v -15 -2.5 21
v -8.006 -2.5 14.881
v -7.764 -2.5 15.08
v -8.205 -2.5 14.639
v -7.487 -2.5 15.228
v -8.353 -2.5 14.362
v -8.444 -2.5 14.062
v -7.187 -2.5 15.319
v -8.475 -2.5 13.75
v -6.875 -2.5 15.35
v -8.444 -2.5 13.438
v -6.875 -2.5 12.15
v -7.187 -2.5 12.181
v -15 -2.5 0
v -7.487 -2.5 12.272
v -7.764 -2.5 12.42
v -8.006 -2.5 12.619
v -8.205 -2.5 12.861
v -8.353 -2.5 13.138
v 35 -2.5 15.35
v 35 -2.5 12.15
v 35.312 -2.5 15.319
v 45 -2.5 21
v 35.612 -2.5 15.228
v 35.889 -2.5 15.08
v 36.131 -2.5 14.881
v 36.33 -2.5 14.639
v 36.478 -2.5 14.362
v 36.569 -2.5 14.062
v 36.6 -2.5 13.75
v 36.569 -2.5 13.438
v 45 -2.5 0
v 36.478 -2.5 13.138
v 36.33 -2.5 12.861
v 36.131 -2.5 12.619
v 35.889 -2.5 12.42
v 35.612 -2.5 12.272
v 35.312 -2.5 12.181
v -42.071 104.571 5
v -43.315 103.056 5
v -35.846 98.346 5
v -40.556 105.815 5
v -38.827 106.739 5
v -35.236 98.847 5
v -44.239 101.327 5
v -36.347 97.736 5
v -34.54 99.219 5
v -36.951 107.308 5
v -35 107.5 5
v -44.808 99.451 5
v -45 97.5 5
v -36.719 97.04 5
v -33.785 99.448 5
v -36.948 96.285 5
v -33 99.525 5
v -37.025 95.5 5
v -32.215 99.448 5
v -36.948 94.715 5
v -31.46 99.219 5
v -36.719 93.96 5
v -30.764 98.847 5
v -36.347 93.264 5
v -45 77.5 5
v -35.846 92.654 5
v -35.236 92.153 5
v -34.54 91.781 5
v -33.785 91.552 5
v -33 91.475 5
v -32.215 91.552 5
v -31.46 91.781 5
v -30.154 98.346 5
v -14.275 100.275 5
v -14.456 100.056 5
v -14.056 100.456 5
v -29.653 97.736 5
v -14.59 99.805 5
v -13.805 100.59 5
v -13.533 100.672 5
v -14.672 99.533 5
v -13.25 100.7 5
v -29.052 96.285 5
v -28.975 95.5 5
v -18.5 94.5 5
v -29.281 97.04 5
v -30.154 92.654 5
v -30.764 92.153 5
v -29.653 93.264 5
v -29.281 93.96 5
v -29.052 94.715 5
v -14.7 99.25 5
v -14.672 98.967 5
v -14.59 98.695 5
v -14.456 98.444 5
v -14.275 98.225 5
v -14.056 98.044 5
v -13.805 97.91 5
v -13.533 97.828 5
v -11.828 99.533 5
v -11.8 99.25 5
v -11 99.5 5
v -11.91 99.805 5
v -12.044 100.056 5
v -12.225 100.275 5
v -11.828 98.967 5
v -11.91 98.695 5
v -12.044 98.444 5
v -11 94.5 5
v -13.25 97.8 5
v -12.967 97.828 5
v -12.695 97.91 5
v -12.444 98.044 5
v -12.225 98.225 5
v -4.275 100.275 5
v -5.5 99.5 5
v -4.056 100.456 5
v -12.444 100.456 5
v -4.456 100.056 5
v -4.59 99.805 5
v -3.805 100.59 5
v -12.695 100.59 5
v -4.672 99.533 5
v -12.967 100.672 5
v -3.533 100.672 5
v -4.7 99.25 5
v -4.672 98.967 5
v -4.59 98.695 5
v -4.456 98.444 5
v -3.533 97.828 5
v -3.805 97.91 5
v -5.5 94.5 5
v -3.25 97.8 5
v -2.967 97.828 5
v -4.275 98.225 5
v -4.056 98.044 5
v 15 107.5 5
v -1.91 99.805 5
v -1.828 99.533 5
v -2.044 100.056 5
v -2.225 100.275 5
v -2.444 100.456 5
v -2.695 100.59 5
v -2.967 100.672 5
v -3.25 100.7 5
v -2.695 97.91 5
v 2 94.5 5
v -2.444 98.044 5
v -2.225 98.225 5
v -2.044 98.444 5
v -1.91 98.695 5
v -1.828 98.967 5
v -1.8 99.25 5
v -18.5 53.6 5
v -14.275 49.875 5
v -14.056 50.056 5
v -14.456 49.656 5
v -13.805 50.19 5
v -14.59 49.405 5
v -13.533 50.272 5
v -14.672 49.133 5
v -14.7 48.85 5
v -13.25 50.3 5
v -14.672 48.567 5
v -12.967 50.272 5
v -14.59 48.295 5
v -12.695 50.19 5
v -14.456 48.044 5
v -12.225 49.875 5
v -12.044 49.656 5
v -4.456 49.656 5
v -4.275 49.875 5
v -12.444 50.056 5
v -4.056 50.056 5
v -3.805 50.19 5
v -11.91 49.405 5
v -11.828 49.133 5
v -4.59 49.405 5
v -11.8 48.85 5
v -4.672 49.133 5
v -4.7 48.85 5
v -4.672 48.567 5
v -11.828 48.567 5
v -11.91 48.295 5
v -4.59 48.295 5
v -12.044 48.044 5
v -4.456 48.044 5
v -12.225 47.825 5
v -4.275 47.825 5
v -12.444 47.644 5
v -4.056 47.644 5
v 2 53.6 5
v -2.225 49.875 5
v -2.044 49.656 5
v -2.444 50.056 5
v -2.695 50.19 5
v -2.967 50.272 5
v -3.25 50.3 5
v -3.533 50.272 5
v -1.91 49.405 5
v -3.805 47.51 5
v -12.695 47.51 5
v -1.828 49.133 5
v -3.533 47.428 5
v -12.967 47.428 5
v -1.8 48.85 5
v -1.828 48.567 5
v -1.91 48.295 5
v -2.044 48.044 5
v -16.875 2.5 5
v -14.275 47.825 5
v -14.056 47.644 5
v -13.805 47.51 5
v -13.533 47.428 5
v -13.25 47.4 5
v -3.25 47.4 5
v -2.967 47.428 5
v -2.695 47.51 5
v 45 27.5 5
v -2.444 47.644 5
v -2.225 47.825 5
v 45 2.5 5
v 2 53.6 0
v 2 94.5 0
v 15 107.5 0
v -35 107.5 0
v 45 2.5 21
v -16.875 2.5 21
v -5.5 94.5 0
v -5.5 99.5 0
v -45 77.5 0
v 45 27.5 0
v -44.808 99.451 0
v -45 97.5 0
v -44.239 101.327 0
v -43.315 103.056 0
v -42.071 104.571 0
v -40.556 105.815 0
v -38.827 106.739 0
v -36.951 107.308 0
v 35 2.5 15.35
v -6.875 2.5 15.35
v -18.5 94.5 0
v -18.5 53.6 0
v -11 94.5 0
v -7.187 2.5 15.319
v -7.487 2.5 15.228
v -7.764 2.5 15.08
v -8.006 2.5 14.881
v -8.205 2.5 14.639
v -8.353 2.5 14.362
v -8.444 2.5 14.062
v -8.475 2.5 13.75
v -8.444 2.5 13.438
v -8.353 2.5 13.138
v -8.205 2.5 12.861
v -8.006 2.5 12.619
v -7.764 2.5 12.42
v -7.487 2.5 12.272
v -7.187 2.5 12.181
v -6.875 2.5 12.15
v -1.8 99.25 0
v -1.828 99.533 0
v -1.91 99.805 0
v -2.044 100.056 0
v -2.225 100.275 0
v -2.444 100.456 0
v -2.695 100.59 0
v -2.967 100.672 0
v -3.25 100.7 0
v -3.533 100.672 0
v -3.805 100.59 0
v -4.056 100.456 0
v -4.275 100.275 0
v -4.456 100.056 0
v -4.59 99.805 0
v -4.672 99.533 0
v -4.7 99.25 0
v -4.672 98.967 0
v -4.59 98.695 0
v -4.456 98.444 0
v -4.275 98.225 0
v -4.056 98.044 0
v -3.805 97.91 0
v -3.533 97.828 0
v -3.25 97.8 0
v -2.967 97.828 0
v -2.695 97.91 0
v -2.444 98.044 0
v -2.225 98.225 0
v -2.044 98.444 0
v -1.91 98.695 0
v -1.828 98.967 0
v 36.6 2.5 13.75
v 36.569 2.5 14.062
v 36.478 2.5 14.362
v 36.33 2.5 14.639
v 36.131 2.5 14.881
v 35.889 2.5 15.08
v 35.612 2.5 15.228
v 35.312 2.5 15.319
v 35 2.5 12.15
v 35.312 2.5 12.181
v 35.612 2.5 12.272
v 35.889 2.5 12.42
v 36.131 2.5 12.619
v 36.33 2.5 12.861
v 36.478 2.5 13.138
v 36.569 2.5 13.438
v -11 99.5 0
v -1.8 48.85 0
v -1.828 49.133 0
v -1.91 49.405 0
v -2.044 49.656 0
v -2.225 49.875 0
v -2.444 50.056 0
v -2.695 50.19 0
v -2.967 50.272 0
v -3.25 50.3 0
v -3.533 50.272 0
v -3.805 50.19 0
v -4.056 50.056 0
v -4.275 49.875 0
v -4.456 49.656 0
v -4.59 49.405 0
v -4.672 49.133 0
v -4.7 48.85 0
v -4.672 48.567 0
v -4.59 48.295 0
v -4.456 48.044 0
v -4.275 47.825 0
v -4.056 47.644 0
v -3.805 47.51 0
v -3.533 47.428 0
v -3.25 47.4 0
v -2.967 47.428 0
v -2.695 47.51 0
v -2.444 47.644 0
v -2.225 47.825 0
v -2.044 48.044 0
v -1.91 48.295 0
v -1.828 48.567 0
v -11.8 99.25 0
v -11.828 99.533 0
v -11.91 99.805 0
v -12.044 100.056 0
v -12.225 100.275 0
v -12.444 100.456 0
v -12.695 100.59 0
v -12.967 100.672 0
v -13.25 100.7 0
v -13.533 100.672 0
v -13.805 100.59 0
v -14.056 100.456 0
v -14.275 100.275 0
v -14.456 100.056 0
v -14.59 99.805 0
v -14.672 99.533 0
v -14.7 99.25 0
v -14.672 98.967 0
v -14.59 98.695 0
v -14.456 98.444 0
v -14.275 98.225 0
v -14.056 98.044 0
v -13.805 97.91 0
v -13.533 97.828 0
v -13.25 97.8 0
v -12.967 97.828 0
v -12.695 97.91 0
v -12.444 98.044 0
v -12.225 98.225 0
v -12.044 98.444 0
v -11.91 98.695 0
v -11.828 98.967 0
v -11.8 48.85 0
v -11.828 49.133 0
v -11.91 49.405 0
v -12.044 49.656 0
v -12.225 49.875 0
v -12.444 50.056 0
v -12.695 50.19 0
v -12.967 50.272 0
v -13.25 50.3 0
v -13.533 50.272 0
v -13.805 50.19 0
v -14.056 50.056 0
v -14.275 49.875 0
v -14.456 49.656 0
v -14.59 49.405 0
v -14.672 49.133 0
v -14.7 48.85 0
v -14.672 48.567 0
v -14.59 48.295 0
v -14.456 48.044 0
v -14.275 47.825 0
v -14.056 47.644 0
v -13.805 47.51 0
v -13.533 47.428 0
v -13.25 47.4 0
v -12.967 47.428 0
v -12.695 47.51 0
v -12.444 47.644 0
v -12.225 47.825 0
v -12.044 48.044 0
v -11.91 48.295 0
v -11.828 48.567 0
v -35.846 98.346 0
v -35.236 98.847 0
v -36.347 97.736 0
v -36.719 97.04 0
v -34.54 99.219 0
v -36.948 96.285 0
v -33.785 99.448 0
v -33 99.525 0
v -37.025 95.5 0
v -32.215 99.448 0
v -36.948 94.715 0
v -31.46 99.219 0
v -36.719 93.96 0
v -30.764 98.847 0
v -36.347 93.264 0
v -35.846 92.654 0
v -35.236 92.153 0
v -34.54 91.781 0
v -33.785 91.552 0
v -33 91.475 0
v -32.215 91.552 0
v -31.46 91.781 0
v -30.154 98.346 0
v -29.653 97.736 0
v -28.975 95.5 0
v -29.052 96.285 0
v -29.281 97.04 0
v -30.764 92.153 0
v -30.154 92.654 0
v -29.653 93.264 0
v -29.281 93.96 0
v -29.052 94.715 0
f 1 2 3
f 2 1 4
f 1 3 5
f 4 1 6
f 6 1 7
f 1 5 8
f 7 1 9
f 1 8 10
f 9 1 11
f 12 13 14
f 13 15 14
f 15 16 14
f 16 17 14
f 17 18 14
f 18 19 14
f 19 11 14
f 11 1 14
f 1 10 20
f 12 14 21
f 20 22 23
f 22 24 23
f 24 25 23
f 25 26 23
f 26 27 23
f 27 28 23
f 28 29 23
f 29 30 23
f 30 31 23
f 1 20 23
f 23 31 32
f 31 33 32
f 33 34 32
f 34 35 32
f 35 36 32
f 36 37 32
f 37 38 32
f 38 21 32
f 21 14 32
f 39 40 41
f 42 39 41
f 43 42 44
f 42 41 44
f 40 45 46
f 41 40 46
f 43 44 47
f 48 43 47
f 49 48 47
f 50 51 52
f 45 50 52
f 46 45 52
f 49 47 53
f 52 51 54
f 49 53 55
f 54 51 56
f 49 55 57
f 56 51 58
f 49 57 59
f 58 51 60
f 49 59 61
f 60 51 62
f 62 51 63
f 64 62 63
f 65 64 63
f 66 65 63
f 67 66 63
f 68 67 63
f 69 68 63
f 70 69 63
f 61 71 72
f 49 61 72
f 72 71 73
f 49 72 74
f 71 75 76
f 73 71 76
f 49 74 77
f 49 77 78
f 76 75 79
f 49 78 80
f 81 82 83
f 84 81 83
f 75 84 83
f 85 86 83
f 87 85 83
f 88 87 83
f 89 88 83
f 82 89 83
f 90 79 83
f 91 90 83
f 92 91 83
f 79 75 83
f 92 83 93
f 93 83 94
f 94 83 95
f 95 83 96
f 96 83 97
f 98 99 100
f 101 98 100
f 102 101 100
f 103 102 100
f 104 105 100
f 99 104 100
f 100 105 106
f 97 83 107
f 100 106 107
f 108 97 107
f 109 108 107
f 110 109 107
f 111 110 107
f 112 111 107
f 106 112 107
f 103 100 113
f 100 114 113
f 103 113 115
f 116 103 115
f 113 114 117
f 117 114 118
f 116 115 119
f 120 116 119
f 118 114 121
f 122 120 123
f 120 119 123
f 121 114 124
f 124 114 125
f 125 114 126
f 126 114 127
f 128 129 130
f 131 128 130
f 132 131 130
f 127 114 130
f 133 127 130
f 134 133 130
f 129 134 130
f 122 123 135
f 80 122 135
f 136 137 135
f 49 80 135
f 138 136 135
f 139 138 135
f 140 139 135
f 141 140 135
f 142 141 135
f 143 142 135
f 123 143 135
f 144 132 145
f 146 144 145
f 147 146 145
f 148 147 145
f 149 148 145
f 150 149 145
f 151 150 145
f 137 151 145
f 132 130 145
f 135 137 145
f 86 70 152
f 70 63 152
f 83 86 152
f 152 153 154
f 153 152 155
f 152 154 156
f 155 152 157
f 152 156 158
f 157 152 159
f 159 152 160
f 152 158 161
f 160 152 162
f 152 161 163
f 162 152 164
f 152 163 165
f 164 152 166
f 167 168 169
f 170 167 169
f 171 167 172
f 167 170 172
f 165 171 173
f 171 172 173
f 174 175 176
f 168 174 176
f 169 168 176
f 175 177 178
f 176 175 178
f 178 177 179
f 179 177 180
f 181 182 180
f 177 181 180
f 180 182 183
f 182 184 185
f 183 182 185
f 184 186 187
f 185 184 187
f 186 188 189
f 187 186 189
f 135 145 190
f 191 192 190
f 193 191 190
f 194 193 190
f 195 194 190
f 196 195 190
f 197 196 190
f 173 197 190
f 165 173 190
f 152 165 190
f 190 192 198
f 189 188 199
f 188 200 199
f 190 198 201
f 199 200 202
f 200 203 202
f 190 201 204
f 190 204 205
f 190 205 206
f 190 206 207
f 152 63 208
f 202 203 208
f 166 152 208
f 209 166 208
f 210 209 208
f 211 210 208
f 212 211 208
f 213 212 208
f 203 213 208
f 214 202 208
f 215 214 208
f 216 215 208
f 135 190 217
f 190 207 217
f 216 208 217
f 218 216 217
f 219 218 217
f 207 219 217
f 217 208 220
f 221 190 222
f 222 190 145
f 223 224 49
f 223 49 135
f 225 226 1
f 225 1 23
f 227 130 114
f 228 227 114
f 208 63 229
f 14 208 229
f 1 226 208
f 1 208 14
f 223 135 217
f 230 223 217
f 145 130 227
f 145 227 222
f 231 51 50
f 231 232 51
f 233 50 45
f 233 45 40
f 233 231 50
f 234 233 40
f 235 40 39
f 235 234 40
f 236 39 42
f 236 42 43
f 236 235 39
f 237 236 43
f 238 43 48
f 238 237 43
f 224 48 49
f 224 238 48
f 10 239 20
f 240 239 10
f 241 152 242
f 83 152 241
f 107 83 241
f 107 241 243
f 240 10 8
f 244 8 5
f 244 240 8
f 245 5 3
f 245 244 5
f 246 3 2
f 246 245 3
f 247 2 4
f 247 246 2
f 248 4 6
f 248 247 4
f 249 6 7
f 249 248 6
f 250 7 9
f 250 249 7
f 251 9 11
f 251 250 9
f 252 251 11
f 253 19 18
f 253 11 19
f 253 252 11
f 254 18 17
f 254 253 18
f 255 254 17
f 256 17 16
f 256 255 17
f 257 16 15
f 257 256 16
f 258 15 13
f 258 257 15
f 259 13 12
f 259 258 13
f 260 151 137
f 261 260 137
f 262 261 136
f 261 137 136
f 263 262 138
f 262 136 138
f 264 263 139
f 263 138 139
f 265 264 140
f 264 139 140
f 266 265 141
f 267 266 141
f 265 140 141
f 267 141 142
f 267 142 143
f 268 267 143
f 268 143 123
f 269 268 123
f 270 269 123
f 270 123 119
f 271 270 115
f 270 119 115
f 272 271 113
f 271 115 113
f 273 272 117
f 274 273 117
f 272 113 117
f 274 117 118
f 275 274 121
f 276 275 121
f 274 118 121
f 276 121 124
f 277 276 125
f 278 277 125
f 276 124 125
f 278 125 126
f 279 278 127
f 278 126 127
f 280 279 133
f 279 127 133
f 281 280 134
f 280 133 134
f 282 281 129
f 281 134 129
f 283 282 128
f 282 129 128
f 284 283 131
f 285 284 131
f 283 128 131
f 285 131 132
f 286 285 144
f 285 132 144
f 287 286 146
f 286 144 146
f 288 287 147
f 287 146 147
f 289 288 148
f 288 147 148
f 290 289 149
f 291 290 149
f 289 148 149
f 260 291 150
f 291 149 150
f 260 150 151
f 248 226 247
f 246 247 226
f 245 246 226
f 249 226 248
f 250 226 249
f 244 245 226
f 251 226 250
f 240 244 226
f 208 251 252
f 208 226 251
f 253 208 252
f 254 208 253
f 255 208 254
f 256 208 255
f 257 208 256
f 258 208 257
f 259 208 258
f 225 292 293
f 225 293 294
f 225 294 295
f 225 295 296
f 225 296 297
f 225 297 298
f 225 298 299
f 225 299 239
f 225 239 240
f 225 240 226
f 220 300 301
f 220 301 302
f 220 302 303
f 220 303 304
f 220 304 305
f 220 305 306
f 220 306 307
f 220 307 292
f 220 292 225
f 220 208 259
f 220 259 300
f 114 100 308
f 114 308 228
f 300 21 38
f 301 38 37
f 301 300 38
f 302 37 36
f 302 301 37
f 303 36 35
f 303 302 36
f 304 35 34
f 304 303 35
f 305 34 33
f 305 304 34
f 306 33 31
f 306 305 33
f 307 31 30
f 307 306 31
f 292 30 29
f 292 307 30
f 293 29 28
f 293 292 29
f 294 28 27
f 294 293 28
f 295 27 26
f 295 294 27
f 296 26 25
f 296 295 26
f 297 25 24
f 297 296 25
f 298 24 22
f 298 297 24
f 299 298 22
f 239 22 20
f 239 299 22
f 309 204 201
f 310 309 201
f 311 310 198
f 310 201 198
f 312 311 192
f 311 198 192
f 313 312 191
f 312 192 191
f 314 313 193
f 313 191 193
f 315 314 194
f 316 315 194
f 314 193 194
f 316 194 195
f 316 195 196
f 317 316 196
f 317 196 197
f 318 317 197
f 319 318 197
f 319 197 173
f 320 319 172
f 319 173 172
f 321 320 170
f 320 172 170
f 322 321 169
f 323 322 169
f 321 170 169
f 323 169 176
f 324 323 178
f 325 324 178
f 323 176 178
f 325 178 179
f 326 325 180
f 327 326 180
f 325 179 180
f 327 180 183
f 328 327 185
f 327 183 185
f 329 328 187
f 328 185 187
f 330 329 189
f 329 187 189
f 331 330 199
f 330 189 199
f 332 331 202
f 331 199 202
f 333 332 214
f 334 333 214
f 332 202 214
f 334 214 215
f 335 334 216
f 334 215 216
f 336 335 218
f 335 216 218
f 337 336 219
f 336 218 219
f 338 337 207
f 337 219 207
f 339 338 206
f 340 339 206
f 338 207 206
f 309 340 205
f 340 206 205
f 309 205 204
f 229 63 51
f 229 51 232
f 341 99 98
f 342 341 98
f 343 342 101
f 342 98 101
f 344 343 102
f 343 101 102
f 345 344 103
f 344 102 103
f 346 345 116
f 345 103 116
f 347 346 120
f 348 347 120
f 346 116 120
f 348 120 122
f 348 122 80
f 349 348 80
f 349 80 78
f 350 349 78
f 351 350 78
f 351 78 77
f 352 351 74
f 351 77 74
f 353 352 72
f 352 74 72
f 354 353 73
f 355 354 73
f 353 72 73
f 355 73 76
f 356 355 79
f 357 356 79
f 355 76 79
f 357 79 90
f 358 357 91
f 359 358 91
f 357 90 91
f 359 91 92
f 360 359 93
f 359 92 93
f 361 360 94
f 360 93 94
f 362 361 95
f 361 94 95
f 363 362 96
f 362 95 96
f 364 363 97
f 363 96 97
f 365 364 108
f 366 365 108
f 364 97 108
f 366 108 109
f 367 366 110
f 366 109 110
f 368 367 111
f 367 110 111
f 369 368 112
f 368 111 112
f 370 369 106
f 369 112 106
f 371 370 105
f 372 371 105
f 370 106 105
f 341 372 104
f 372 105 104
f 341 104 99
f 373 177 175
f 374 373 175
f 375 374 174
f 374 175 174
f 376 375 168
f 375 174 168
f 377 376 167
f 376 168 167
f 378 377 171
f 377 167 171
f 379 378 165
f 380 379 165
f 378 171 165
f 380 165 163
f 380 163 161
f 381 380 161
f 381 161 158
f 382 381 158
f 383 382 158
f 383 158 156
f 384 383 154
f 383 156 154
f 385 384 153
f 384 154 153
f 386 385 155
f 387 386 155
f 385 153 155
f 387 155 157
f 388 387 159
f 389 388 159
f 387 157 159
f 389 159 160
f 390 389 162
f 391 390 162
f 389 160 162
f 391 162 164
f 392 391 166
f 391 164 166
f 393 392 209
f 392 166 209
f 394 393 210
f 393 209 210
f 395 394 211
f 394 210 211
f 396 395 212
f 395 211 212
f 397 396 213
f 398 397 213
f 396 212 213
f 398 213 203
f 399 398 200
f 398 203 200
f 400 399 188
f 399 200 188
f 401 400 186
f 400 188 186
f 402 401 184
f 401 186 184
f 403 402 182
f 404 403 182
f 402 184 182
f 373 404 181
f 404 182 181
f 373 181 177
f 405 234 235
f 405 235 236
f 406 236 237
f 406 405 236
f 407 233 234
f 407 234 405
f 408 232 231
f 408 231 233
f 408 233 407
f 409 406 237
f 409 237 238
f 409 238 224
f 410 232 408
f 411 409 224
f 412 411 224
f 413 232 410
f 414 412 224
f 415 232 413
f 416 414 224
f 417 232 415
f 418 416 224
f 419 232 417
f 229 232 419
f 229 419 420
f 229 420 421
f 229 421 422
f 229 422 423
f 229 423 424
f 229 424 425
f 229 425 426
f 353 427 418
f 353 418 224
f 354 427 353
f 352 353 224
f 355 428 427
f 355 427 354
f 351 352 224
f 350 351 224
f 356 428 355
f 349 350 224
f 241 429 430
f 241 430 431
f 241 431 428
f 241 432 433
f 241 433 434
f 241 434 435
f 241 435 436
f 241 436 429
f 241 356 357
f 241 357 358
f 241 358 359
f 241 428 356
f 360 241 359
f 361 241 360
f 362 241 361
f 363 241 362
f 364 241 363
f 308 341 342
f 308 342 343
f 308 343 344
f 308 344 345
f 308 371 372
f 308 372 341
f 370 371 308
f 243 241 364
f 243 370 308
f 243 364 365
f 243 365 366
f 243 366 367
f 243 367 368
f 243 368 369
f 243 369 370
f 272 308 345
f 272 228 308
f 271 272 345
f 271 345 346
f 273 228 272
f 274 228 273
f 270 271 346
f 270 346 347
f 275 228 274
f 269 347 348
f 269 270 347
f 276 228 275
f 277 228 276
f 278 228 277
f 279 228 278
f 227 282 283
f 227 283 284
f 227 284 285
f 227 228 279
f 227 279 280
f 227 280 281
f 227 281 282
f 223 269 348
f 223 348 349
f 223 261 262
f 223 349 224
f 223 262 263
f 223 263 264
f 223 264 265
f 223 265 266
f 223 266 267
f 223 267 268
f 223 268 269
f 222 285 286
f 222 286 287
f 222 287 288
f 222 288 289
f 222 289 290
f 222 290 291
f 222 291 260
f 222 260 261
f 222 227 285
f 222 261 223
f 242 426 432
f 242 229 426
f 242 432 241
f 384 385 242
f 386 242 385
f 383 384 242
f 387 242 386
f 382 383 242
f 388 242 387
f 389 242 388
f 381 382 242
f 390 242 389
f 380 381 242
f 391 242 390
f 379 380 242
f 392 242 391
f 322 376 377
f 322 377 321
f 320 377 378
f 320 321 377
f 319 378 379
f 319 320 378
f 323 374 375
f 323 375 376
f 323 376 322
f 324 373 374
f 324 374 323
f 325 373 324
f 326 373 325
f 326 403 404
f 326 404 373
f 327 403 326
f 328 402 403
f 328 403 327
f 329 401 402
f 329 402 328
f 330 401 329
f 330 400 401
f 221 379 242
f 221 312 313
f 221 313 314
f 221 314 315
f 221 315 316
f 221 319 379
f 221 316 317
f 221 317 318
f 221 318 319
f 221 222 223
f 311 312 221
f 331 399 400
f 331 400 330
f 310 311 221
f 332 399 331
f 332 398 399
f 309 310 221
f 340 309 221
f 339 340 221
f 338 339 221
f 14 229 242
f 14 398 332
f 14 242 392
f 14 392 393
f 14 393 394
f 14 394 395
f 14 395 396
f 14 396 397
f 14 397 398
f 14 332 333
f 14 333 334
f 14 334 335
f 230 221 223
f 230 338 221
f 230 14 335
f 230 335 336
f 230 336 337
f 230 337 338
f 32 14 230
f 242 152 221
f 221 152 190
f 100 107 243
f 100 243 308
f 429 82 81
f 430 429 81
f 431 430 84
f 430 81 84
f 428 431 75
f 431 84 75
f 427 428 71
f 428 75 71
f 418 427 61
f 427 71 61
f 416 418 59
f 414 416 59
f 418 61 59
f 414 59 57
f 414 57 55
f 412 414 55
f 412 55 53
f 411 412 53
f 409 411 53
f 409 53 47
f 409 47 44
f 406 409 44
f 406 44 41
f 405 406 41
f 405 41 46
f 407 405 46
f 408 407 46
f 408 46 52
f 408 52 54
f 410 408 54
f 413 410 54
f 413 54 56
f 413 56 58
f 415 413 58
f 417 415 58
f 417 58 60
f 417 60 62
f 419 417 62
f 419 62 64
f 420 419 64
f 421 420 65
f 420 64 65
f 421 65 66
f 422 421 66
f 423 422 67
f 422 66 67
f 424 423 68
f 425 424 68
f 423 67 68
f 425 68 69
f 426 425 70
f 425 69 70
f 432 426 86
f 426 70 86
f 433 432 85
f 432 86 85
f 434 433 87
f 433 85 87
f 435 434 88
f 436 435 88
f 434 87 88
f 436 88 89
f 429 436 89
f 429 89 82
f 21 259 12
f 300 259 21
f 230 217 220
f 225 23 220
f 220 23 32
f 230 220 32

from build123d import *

# Parameters (mm, degrees)
SKETCH2_W           = 90
SKETCH2_H           = 5
BOSS_EXTRUDE1_DEPTH = 21
SKETCH3_W           = 90
SKETCH3_H           = 5
BOSS_EXTRUDE2_DEPTH = 105
FILLET1_R           = 10
SKETCH4_R           = 4.025
CUT_EXTRUDE1_DEPTH  = 118.631840928
CUT_EXTRUDE2_DEPTH  = 119.415581745
SKETCH7_R           = 1.45
CUT_EXTRUDE4_DEPTH  = 5
SKETCH6_W           = 5.5
SKETCH6_H           = 5
SKETCH6_W_2         = 20.5
SKETCH6_H_2         = 40.9
CUT_EXTRUDE3_DEPTH  = 118.631840928
CUT_EXTRUDE5_DEPTH  = 10


with BuildPart() as part:
    # Sketch2 → Boss-Extrude1 (new body)
    with BuildSketch(Plane.XY):
        Rectangle(SKETCH2_W, SKETCH2_H)
    extrude(amount=BOSS_EXTRUDE1_DEPTH)

    # Sketch3 → Boss-Extrude2 (add)
    with BuildSketch(Plane(origin=(0, 2.5, 0), x_dir=(1, 0, 0), z_dir=(0, 1, 0))):
        with Locations((0, -2.5)):
            Rectangle(SKETCH3_W, SKETCH3_H)
    extrude(amount=BOSS_EXTRUDE2_DEPTH)

    # Fillet1
    fillet1_edges = [part.edges().sort_by_distance(p)[0] for p in [
        (-45, 107.5, 2.5),
    ]]
    fillet(fillet1_edges, radius=FILLET1_R)

    # Sketch4 → Cut-Extrude1 (cut, through all)
    with BuildSketch(Plane.XY.offset(5)):
        with Locations((-33, 95.5)):
            Circle(SKETCH4_R)
    extrude(amount=-CUT_EXTRUDE1_DEPTH, mode=Mode.SUBTRACT)

    # Sketch5 → Cut-Extrude2 (cut, through all)
    with BuildSketch(Plane.XY.offset(21)):
        Polygon((-45, 77.5), (-15, -2.5), (-45, -2.5), align=None)
        Polygon((15, 107.5), (45, 27.5), (45, 107.5), align=None)
    extrude(amount=-CUT_EXTRUDE2_DEPTH, mode=Mode.SUBTRACT)

    # Sketch7 → Cut-Extrude4 (cut)
    with BuildSketch(Plane.XY.offset(5)):
        with Locations((-13.25, 48.85)):
            Circle(SKETCH7_R)
        with Locations((-3.25, 48.85)):
            Circle(SKETCH7_R)
        with Locations((-3.25, 99.25)):
            Circle(SKETCH7_R)
        with Locations((-13.25, 99.25)):
            Circle(SKETCH7_R)
    extrude(amount=-CUT_EXTRUDE4_DEPTH, mode=Mode.SUBTRACT)

    # Sketch6 → Cut-Extrude3 (cut, through all)
    with BuildSketch(Plane.XY.offset(5)):
        with Locations((-8.25, 97)):
            Rectangle(SKETCH6_W, SKETCH6_H)
        with Locations((-8.25, 74.05)):
            Rectangle(SKETCH6_W_2, SKETCH6_H_2)
    extrude(amount=-CUT_EXTRUDE3_DEPTH, mode=Mode.SUBTRACT)

    # Sketch8 → Cut-Extrude5 (cut)
    with BuildSketch(Plane(origin=(0, 2.5, 0), x_dir=(1, 0, 0), z_dir=(0, 1, 0))):
        with BuildLine():
            Line((-6.875, -12.15), (35, -12.15))
            ThreePointArc((35, -12.15), (36.6, -13.75), (35, -15.35))
            Line((35, -15.35), (-6.875, -15.35))
            ThreePointArc((-6.875, -15.35), (-8.475, -13.75), (-6.875, -12.15))
        make_face()
    extrude(amount=-CUT_EXTRUDE5_DEPTH, mode=Mode.SUBTRACT)


solid = part.part
